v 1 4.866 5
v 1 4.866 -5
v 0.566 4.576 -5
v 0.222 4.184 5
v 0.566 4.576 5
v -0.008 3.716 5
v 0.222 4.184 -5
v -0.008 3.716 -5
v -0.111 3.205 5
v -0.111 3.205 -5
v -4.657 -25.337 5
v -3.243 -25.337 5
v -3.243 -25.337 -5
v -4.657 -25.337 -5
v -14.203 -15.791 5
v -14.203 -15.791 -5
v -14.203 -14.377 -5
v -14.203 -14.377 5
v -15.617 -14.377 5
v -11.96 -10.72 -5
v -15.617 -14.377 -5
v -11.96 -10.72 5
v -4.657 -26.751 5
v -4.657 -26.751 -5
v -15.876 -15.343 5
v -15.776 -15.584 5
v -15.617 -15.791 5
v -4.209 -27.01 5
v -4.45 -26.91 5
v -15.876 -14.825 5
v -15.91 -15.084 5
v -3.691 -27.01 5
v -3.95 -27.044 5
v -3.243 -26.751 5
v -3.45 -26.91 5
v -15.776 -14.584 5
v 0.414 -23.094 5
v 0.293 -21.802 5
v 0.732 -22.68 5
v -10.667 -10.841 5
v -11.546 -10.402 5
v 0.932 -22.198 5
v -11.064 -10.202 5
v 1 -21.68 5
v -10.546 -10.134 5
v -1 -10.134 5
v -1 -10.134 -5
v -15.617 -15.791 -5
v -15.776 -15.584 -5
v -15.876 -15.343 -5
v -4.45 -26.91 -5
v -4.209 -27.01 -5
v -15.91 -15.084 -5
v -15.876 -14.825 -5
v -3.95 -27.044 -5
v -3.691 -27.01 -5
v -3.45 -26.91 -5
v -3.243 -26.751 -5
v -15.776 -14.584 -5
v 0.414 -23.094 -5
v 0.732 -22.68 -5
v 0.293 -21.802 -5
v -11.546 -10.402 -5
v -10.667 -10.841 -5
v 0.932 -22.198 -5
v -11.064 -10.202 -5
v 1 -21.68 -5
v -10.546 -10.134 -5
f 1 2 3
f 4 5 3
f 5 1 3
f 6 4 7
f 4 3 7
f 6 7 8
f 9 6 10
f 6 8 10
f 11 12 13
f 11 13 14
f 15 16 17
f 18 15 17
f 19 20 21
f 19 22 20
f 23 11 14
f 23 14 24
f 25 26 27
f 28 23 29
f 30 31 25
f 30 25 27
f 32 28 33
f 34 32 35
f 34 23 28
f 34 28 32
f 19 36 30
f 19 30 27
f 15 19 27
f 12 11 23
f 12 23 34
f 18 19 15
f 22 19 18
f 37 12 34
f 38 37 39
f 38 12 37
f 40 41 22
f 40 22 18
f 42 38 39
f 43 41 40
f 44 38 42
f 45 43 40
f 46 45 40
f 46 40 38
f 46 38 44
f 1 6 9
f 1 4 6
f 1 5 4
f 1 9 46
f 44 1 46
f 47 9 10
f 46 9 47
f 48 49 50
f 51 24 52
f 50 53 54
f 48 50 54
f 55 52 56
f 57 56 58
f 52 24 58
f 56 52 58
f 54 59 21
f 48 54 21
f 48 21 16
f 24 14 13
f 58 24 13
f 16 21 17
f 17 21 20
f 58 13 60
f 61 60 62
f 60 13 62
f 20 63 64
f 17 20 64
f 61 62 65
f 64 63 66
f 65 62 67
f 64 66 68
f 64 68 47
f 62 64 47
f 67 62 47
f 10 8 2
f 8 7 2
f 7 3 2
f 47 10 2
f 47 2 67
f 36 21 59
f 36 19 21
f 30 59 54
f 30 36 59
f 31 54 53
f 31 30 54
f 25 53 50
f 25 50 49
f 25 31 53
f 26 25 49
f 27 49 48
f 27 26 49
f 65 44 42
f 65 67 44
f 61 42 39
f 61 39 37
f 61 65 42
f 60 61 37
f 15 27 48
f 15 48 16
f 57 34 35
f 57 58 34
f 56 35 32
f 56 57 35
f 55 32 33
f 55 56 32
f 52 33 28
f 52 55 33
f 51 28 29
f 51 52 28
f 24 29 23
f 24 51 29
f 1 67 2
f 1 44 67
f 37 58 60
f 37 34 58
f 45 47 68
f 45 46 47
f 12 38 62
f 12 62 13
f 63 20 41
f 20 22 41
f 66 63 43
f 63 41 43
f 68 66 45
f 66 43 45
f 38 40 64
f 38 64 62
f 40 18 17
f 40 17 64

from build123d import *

# Parameters (mm, degrees)
F1_DEPTH    = 5
F2_R        = 2
F3_R        = 0.99999
F4_T1_DEPTH = 18.321255839


# Not quite as in the source:
# - a fillet or chamfer that OpenCascade refuses, or shapes differently, is made with other operations: its cross-section is extruded or revolved along the edge and cut away or added
# - a fillet or chamfer is up to 0.001 mm smaller than in the source, because OpenCascade refuses the exact size


with BuildPart() as f1:
    # F0 (on Top) → F1 (new body, symmetric)
    with BuildSketch(Plane.XY):
        Polygon((-3.2426406871, -26.7513532198), (1, -22.5087125327), (1, 4.8656561381), (0, 4.8656561381), (-1, -10.1343438619), (-11.3743686708, -10.1343438619), (-15.6170093579, -14.3769845491), (-14.2027957955, -14.3769845491), (-10.6672618896, -10.8414506431), (0.2928932188, -21.8016057515), (-3.2426406871, -25.3371396575), align=None)
        Polygon((-3.9497474683, -27.458460001), (-3.2426406871, -26.7513532198), (-4.6568542495, -26.7513532198), align=None)
        Polygon((-4.6568542495, -26.7513532198), (-3.2426406871, -26.7513532198), (-3.2426406871, -25.3371396575), align=None)
        Polygon((-4.6568542495, -25.3371396575), (-4.6568542495, -26.7513532198), (-3.2426406871, -25.3371396575), align=None)
        Polygon((-15.6170093579, -15.7911981114), (-15.6170093579, -14.3769845491), (-16.3241161391, -15.0840913303), align=None)
        Polygon((-14.2027957955, -14.3769845491), (-15.6170093579, -14.3769845491), (-15.6170093579, -15.7911981114), align=None)
        Polygon((-14.2027957955, -15.7911981114), (-14.2027957955, -14.3769845491), (-15.6170093579, -15.7911981114), align=None)
    extrude(amount=F1_DEPTH, both=True)

    # F2
    f2_edges = [f1.edges().sort_by_distance(p)[0] for p in [
        (-11.374369, -10.134344, 0),
        (1, -22.508713, 0),
    ]]
    fillet(f2_edges, radius=F2_R)

    # F3 (radius 1 in the source; OpenCascade refuses exactly that, so slightly less here)
    f3_edges = [f1.edges().sort_by_distance(p)[0] for p in [
        (-16.324116, -15.084091, 0),
        (-3.949747, -27.45846, 0),
    ]]
    fillet(f3_edges, radius=F3_R)

    # F4: fillet of radius 2 on 1 edges, made by hand

    # F4_s2 → F4_t1 (cut)
    with BuildSketch(Plane.XY.offset(-9.1606279195)):
        with BuildLine():
            ThreePointArc((1, 4.8656561381), (0.2224588554, 4.1839894082), (-0.1107043409, 3.2050910239))
            Line((-0.1107043409, 3.2050910239), (0, 4.8656561381))
            Line((0, 4.8656561381), (1, 4.8656561381))
        make_face()
    extrude(amount=F4_T1_DEPTH, mode=Mode.SUBTRACT)


solid = f1.part
